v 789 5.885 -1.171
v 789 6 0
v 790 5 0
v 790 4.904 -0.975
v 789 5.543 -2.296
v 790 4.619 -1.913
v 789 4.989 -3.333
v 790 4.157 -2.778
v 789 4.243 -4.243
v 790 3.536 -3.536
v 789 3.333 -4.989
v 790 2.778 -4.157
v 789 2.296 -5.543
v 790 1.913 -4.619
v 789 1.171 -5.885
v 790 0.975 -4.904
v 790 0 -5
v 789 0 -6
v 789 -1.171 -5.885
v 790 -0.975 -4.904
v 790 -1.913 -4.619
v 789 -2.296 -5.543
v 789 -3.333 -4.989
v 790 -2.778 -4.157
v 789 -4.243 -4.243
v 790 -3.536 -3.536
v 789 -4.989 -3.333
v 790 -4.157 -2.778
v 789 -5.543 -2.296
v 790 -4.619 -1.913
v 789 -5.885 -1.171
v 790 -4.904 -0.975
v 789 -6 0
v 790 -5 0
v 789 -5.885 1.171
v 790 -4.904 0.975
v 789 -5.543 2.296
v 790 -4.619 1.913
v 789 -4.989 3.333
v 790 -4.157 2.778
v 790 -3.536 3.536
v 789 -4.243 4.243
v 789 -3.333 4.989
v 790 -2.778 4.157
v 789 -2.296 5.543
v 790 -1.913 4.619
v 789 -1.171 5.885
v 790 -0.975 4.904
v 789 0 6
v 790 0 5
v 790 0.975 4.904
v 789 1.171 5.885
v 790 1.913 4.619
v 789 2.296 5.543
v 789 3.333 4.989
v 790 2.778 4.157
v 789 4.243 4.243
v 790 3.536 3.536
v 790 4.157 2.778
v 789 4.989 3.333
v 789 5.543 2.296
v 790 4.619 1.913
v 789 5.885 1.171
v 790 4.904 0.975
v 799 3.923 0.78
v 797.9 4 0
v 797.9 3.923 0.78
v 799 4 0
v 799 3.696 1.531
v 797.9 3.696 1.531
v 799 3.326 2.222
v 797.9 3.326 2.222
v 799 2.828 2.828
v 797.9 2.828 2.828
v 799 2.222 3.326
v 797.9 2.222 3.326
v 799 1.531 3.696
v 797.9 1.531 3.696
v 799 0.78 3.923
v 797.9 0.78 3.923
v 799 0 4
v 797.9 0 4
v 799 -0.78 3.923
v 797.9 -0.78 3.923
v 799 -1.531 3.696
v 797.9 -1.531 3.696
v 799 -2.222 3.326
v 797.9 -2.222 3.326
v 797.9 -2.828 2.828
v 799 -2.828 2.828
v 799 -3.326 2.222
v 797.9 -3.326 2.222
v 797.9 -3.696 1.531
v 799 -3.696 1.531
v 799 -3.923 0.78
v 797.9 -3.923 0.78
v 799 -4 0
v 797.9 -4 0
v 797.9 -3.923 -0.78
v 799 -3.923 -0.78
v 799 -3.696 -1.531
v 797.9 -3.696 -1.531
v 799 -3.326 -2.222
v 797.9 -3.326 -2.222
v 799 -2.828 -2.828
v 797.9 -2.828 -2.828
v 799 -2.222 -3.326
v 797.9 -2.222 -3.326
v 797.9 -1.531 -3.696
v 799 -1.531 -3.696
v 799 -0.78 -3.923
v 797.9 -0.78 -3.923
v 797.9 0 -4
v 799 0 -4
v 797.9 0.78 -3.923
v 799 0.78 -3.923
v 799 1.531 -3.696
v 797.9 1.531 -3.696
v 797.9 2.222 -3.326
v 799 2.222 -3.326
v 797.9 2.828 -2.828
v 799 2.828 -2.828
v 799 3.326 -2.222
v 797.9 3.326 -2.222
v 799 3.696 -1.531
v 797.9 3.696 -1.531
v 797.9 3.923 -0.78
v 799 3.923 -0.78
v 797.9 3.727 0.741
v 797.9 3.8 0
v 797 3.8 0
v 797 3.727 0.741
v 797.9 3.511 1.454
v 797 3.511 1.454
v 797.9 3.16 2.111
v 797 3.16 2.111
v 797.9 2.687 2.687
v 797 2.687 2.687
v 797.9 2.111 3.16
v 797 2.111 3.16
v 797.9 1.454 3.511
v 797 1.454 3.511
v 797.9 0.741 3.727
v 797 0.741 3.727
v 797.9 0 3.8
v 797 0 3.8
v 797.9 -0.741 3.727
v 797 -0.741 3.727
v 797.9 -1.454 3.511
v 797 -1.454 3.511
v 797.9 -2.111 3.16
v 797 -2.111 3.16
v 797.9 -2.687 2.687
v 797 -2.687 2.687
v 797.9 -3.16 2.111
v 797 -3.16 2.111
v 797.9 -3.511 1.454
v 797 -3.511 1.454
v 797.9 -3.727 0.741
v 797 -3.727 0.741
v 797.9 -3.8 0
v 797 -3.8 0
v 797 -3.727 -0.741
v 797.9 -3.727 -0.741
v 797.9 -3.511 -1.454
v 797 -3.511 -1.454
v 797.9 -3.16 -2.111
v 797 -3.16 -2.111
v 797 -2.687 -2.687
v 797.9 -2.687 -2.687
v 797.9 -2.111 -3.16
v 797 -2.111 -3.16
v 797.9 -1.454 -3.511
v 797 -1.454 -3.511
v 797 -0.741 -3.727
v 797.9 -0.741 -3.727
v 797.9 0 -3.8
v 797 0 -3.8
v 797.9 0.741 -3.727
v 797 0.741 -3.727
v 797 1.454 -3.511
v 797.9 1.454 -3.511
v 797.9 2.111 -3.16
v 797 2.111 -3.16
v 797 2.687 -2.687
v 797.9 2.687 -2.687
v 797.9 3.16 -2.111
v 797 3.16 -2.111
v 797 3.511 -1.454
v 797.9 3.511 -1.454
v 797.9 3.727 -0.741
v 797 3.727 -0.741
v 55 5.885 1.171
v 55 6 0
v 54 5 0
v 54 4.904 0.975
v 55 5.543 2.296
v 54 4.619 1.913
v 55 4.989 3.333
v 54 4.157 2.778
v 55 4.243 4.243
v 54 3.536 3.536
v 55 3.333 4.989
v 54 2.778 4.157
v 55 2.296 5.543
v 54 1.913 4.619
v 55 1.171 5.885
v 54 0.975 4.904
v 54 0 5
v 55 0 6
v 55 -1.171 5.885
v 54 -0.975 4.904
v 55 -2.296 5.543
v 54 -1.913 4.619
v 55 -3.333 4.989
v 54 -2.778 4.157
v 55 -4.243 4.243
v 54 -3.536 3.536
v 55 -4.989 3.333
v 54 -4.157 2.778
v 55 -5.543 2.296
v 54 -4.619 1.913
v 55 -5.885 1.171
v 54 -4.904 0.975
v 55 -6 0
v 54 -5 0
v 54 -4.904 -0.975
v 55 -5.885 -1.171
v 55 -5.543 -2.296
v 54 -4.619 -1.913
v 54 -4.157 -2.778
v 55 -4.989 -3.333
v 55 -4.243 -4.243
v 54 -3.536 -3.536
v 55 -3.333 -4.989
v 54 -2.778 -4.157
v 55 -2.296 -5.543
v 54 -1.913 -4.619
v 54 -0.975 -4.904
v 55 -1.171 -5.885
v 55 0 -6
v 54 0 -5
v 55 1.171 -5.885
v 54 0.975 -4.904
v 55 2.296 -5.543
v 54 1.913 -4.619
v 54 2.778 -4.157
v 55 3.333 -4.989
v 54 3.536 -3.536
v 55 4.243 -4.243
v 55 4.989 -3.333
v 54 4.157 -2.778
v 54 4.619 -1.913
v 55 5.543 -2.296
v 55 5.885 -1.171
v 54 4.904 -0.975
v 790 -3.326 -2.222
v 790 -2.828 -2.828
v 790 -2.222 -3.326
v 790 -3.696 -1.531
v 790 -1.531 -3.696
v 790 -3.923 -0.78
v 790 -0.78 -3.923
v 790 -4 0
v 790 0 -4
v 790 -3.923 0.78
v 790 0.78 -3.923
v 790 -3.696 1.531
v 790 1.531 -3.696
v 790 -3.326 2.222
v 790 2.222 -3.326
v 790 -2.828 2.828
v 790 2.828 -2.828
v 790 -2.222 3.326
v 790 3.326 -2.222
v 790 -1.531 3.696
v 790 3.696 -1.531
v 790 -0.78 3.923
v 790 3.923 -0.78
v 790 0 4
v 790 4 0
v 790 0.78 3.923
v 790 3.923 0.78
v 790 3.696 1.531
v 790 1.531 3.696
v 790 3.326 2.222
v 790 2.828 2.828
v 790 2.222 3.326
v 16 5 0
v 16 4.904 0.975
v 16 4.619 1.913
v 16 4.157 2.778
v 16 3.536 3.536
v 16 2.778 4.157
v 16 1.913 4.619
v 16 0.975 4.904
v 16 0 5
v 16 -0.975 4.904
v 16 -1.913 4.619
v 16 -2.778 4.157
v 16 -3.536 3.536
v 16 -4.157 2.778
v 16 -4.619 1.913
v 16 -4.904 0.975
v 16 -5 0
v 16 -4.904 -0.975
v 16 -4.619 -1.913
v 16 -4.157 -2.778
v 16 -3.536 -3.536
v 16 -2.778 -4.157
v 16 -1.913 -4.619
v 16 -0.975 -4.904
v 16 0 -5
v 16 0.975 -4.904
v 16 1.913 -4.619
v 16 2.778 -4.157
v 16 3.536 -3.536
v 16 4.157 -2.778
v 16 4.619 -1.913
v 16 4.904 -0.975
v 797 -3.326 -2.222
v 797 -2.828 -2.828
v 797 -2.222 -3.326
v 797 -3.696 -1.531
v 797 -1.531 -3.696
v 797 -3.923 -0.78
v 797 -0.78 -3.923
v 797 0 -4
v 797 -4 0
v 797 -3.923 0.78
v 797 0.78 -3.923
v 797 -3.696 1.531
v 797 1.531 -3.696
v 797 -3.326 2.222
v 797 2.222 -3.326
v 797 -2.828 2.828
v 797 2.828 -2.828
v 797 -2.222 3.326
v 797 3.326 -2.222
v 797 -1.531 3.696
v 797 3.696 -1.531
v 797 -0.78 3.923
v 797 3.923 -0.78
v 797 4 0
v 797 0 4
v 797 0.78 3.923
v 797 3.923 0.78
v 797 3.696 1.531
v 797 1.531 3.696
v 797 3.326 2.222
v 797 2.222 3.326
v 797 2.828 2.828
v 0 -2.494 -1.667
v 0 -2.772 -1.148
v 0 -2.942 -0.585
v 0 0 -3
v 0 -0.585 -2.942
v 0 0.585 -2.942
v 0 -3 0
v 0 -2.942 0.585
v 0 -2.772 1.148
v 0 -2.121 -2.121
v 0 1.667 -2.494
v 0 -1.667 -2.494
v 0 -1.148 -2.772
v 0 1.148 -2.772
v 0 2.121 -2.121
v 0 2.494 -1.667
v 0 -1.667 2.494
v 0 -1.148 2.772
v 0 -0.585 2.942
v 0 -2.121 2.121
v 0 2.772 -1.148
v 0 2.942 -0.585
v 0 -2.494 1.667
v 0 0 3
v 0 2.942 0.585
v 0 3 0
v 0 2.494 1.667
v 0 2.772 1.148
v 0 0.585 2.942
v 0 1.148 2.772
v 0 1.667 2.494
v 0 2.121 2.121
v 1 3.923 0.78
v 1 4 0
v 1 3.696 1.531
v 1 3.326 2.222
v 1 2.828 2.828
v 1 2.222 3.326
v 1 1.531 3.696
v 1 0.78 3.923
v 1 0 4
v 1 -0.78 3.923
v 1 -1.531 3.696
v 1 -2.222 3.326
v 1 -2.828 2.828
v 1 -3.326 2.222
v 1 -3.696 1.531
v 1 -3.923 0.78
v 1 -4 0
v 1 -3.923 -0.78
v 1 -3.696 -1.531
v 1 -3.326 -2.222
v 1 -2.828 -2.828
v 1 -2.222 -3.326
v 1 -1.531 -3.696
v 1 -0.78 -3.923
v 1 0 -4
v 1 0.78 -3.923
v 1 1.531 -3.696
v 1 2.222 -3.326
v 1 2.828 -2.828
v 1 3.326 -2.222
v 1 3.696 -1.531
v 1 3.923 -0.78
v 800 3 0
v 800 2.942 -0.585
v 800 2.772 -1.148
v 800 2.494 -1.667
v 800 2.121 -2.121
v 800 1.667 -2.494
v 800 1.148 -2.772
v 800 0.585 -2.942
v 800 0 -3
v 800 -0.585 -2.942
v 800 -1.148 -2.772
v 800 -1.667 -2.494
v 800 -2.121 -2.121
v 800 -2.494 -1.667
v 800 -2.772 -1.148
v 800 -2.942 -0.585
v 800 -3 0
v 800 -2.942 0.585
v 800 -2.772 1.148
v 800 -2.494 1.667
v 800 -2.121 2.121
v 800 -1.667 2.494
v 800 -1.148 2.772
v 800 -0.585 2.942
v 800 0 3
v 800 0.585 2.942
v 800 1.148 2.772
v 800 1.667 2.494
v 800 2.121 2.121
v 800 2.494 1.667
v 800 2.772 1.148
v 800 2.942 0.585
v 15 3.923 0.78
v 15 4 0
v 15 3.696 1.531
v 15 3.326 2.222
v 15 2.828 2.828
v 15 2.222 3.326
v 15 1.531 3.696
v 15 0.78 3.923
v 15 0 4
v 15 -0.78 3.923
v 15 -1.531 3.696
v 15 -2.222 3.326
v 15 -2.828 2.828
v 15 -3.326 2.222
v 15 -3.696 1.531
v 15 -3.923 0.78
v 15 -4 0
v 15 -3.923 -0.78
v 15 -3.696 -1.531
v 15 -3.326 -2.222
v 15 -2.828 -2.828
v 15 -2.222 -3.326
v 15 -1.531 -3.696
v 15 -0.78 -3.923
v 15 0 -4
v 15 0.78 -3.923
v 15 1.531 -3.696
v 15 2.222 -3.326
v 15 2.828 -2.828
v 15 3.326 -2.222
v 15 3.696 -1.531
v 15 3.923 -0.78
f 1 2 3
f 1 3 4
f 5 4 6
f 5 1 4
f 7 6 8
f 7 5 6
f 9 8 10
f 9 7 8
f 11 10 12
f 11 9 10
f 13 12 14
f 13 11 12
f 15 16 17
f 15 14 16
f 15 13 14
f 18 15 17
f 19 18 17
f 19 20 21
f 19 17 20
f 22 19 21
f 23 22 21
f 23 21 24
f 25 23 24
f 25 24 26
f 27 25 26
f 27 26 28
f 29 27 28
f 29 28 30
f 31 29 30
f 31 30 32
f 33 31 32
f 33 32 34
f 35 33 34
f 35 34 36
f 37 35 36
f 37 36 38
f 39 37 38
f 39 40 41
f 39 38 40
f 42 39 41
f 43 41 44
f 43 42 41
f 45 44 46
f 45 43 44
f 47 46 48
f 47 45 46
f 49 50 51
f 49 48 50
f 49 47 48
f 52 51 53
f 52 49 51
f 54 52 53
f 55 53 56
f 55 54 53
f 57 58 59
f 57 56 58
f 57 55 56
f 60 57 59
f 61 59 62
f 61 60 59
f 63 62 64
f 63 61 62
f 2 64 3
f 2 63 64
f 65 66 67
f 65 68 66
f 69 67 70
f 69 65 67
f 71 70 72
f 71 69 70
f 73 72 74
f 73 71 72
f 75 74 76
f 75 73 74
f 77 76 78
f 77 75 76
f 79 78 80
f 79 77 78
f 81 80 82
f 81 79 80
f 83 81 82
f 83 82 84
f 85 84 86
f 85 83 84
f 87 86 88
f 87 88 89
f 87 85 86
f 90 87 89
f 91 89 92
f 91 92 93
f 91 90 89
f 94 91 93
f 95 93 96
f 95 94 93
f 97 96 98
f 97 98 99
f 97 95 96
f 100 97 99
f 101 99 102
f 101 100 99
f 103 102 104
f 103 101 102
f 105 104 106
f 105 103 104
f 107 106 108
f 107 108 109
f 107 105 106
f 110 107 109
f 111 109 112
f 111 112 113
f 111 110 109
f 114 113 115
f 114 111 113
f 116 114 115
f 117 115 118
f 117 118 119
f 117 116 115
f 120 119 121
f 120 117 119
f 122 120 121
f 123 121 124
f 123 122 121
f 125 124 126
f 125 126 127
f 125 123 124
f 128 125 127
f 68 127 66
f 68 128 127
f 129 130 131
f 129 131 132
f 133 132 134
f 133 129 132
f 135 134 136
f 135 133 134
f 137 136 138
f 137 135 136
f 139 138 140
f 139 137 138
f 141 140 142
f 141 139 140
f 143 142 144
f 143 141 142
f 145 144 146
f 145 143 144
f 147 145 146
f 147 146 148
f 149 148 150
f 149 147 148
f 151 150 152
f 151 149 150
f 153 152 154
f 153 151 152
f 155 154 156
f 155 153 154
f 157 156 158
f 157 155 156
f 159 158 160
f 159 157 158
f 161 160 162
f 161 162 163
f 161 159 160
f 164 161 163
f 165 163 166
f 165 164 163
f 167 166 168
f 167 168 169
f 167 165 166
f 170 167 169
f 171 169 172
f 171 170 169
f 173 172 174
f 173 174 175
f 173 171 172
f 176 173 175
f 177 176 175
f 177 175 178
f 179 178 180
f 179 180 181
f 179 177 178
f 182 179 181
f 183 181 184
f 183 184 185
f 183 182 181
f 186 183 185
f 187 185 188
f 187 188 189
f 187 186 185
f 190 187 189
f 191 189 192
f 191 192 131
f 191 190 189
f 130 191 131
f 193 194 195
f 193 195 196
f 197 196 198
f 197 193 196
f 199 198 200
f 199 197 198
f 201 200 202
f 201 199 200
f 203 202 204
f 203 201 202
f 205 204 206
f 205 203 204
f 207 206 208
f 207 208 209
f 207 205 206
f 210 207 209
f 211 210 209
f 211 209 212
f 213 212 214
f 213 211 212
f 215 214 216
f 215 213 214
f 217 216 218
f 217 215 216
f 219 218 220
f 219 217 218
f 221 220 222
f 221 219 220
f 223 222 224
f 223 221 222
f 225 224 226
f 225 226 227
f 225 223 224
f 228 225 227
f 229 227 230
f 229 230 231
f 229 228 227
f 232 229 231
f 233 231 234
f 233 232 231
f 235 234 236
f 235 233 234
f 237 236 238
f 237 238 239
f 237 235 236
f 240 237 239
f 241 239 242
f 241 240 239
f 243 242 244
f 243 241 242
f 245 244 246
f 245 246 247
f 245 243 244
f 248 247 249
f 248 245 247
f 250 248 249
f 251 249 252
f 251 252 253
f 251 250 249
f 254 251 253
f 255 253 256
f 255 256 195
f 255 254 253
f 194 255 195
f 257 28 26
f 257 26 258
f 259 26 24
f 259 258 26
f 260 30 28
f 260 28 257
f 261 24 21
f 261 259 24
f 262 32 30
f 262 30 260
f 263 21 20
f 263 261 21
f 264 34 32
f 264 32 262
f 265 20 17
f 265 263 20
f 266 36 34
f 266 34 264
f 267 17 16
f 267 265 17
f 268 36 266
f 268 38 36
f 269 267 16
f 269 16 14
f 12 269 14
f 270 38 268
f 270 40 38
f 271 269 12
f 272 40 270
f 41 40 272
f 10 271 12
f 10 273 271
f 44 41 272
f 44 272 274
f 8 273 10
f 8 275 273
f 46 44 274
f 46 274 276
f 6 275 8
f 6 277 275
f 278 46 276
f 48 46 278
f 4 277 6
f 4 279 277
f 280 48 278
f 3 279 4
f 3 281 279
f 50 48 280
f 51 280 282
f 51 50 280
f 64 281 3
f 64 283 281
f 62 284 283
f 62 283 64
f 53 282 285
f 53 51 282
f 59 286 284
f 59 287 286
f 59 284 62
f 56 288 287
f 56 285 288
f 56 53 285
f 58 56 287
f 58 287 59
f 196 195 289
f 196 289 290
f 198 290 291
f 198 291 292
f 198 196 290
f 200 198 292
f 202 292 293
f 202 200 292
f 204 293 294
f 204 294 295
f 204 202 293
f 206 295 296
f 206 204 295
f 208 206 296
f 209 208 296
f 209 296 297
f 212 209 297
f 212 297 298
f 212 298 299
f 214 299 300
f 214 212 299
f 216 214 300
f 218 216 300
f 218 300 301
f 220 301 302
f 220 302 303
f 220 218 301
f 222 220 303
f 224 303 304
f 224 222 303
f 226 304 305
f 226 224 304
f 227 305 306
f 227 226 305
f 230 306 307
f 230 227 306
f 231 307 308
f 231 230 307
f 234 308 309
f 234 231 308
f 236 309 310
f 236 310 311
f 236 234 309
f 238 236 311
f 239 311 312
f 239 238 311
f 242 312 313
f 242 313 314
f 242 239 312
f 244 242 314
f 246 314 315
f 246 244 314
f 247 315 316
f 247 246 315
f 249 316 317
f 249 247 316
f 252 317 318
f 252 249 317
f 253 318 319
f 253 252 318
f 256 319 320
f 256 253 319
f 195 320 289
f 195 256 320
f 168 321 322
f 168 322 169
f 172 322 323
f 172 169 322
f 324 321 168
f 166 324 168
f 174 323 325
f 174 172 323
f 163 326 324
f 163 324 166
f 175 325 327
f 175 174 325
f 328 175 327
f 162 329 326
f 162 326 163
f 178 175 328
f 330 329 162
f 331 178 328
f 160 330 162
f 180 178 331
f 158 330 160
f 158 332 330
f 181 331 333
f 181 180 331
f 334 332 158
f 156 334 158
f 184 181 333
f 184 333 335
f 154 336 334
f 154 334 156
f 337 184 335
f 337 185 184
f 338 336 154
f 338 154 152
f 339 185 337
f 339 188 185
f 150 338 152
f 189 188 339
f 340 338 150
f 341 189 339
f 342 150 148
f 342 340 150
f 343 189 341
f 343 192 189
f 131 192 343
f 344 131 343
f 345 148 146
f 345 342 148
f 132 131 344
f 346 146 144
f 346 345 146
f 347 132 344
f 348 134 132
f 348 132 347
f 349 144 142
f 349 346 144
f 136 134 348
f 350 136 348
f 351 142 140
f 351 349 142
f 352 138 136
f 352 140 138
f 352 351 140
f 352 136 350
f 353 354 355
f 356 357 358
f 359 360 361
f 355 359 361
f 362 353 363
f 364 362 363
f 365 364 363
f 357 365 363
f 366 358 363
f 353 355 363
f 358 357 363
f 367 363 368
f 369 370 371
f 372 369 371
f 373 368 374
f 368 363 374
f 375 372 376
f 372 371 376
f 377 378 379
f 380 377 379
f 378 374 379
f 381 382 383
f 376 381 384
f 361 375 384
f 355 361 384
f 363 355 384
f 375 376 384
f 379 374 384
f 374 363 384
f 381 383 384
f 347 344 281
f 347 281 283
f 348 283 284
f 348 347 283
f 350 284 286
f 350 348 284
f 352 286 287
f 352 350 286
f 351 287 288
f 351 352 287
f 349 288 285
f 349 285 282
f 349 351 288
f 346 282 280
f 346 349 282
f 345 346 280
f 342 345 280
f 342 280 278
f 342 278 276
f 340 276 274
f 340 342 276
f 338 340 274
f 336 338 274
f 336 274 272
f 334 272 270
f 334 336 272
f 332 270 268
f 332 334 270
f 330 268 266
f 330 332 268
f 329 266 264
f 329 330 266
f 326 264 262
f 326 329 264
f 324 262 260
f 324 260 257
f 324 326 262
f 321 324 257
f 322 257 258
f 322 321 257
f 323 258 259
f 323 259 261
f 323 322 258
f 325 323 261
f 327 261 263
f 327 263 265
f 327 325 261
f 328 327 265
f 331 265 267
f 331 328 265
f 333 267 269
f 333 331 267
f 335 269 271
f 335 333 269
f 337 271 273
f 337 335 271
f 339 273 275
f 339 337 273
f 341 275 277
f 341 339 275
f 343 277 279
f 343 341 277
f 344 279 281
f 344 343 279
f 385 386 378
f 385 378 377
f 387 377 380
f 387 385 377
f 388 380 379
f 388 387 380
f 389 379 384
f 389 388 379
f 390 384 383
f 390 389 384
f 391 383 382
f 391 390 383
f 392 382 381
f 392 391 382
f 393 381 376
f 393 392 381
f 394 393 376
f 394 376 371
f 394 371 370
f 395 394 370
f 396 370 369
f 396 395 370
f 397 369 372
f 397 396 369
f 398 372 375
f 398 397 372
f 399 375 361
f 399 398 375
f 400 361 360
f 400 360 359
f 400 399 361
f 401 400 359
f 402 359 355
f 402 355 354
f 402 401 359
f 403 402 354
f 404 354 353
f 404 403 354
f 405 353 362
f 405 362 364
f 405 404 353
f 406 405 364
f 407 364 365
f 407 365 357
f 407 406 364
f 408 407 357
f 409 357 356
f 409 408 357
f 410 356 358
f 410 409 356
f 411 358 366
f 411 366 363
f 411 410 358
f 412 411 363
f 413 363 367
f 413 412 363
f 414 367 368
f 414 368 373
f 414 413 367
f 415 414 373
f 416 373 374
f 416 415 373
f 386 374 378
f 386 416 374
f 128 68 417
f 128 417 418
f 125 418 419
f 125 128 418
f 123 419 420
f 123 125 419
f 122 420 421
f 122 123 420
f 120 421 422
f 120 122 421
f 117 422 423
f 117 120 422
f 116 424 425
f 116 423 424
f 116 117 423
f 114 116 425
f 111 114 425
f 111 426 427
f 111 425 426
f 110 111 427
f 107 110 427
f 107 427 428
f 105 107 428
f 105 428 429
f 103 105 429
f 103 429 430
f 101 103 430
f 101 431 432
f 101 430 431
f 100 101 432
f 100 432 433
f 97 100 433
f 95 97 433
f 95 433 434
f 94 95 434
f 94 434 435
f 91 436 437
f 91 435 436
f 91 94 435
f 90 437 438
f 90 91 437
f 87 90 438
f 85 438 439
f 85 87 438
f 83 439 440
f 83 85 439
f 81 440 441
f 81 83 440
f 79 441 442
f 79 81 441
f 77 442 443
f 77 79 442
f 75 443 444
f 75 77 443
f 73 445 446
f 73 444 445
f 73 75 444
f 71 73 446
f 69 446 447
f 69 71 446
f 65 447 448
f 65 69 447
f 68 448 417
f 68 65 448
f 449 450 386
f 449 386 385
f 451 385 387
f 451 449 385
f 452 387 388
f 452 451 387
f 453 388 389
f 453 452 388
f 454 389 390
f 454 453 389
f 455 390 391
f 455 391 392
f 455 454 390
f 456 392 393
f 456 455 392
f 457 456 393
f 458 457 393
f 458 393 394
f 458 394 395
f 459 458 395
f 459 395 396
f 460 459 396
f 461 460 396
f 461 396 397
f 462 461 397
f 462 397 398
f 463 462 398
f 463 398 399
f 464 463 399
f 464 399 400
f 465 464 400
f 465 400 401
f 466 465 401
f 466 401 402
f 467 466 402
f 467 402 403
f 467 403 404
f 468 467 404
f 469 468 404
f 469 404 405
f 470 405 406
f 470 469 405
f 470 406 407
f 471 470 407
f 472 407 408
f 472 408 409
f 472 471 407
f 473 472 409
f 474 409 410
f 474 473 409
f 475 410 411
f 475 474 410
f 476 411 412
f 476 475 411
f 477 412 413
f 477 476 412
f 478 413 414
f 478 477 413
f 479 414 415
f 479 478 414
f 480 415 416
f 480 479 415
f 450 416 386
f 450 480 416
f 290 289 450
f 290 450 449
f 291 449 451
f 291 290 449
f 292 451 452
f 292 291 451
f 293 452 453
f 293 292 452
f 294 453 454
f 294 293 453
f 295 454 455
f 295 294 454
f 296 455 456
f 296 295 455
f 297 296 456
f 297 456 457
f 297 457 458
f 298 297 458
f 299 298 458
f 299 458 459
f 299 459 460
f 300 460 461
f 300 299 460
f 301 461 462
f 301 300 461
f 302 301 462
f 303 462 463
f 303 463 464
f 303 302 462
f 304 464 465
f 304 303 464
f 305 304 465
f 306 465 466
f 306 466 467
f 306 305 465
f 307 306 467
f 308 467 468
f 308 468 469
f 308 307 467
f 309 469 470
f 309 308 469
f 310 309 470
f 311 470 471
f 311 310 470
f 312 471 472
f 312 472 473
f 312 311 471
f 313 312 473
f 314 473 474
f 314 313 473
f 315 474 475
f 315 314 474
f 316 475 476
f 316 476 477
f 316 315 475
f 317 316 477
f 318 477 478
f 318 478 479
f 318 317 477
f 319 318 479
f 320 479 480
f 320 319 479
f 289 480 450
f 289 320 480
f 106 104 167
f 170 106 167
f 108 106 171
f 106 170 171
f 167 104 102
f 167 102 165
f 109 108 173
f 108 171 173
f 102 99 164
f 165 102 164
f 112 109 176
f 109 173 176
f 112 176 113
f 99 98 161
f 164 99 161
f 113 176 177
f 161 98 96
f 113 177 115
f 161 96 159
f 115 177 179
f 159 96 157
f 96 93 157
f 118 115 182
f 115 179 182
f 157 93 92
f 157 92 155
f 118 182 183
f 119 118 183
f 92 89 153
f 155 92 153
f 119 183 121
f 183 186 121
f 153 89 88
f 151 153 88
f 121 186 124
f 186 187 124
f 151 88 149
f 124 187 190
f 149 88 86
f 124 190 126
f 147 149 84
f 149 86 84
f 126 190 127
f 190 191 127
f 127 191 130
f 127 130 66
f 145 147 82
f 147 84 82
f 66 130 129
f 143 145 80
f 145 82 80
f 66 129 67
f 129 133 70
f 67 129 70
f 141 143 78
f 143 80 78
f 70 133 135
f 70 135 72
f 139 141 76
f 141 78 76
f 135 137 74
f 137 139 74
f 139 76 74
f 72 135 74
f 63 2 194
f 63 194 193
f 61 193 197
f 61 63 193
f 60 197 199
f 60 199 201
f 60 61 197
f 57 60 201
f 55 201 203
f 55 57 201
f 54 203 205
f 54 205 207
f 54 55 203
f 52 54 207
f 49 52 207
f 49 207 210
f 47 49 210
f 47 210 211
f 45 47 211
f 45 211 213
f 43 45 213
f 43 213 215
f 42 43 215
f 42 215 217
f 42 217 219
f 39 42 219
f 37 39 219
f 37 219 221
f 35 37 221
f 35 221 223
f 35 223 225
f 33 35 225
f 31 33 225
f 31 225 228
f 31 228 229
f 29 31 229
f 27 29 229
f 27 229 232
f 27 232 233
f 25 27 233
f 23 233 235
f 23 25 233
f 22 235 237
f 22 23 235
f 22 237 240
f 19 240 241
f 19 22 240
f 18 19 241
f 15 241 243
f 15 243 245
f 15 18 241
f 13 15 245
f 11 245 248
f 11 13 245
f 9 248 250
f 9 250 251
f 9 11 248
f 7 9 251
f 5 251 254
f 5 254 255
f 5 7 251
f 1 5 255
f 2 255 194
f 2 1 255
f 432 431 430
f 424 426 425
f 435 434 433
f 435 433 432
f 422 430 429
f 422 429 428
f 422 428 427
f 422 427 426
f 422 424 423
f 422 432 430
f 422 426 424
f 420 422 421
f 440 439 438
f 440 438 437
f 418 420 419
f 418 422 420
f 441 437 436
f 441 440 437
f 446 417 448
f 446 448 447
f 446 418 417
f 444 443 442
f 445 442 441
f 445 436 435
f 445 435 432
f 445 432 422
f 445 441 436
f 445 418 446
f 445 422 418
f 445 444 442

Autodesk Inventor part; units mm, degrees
ref_plane "YZ Plane" through (0, 0, 0) normal (1, 0, 0) x (0, 1, 0)
ref_plane "XZ Plane" through (0, 0, 0) normal (0, 1, 0) x (-1, 0, 0)
ref_plane "XY Plane" through (0, 0, 0) normal (0, 0, 1) x (1, 0, 0)
sketch "Sketch1" plane through (0, 0, 0) normal (0, 0, 1) x (1, 0, 0)
  line L0 (0, 4) -> (1, 4) construction
  line L1 (15, 4) -> (16, 5)
  line L2 (16, 5) -> (54, 5)
  line L3 (0, 4) -> (0, 3) construction
  line L4 (54, 5) -> (55, 6)
  line L5 (55, 6) -> (789, 6)
  line L6 (0, 3) -> (1, 4)
  line L7 (0, 3) -> (0, 0)
  line L8 (1, 4) -> (15, 4)
  line L9 (789, 6) -> (790, 5)
  line L10 (790, 5) -> (790, 4)
  line L11 (790, 4) -> (797, 4)
  line L12 (797, 4) -> (797, 3.8)
  line L13 (797, 3.8) -> (797.9, 3.8)
  line L14 (797.9, 3.8) -> (797.9, 4)
  line L15 (797.9, 4) -> (799, 4)
  line L16 (799, 4) -> (800, 3)
  line L17 (800, 3) -> (800, 0)
  line L18 (0, 0) -> (800, 0)
  point P0 (0, 0)
  point P1 (800, 1.5)
  dimension "d0" = 4
  dimension "d1" = 5
  dimension "d2" = 6
  dimension "d3" = 135
  dimension "d4" = 135
  dimension "d5" = 15
  dimension "d6" = 39
  dimension "d7" = 135
  dimension "d8" = 4
  dimension "d9" = 7
  dimension "d10" = 10
  dimension "d11" = 0.2
  dimension "d12" = 0.9
  dimension "d14" = 135
  dimension "d15" = 800
revolve "Revolution1" add sketch "Sketch1" angle 360 about axis through (0, 0, 0) along (1, 0, 0)
equation "\"d15\" = SHAFT_LEN"
equation "\"SHAFT_LEN\" = 800"
properties part number "SFU1204-800"
